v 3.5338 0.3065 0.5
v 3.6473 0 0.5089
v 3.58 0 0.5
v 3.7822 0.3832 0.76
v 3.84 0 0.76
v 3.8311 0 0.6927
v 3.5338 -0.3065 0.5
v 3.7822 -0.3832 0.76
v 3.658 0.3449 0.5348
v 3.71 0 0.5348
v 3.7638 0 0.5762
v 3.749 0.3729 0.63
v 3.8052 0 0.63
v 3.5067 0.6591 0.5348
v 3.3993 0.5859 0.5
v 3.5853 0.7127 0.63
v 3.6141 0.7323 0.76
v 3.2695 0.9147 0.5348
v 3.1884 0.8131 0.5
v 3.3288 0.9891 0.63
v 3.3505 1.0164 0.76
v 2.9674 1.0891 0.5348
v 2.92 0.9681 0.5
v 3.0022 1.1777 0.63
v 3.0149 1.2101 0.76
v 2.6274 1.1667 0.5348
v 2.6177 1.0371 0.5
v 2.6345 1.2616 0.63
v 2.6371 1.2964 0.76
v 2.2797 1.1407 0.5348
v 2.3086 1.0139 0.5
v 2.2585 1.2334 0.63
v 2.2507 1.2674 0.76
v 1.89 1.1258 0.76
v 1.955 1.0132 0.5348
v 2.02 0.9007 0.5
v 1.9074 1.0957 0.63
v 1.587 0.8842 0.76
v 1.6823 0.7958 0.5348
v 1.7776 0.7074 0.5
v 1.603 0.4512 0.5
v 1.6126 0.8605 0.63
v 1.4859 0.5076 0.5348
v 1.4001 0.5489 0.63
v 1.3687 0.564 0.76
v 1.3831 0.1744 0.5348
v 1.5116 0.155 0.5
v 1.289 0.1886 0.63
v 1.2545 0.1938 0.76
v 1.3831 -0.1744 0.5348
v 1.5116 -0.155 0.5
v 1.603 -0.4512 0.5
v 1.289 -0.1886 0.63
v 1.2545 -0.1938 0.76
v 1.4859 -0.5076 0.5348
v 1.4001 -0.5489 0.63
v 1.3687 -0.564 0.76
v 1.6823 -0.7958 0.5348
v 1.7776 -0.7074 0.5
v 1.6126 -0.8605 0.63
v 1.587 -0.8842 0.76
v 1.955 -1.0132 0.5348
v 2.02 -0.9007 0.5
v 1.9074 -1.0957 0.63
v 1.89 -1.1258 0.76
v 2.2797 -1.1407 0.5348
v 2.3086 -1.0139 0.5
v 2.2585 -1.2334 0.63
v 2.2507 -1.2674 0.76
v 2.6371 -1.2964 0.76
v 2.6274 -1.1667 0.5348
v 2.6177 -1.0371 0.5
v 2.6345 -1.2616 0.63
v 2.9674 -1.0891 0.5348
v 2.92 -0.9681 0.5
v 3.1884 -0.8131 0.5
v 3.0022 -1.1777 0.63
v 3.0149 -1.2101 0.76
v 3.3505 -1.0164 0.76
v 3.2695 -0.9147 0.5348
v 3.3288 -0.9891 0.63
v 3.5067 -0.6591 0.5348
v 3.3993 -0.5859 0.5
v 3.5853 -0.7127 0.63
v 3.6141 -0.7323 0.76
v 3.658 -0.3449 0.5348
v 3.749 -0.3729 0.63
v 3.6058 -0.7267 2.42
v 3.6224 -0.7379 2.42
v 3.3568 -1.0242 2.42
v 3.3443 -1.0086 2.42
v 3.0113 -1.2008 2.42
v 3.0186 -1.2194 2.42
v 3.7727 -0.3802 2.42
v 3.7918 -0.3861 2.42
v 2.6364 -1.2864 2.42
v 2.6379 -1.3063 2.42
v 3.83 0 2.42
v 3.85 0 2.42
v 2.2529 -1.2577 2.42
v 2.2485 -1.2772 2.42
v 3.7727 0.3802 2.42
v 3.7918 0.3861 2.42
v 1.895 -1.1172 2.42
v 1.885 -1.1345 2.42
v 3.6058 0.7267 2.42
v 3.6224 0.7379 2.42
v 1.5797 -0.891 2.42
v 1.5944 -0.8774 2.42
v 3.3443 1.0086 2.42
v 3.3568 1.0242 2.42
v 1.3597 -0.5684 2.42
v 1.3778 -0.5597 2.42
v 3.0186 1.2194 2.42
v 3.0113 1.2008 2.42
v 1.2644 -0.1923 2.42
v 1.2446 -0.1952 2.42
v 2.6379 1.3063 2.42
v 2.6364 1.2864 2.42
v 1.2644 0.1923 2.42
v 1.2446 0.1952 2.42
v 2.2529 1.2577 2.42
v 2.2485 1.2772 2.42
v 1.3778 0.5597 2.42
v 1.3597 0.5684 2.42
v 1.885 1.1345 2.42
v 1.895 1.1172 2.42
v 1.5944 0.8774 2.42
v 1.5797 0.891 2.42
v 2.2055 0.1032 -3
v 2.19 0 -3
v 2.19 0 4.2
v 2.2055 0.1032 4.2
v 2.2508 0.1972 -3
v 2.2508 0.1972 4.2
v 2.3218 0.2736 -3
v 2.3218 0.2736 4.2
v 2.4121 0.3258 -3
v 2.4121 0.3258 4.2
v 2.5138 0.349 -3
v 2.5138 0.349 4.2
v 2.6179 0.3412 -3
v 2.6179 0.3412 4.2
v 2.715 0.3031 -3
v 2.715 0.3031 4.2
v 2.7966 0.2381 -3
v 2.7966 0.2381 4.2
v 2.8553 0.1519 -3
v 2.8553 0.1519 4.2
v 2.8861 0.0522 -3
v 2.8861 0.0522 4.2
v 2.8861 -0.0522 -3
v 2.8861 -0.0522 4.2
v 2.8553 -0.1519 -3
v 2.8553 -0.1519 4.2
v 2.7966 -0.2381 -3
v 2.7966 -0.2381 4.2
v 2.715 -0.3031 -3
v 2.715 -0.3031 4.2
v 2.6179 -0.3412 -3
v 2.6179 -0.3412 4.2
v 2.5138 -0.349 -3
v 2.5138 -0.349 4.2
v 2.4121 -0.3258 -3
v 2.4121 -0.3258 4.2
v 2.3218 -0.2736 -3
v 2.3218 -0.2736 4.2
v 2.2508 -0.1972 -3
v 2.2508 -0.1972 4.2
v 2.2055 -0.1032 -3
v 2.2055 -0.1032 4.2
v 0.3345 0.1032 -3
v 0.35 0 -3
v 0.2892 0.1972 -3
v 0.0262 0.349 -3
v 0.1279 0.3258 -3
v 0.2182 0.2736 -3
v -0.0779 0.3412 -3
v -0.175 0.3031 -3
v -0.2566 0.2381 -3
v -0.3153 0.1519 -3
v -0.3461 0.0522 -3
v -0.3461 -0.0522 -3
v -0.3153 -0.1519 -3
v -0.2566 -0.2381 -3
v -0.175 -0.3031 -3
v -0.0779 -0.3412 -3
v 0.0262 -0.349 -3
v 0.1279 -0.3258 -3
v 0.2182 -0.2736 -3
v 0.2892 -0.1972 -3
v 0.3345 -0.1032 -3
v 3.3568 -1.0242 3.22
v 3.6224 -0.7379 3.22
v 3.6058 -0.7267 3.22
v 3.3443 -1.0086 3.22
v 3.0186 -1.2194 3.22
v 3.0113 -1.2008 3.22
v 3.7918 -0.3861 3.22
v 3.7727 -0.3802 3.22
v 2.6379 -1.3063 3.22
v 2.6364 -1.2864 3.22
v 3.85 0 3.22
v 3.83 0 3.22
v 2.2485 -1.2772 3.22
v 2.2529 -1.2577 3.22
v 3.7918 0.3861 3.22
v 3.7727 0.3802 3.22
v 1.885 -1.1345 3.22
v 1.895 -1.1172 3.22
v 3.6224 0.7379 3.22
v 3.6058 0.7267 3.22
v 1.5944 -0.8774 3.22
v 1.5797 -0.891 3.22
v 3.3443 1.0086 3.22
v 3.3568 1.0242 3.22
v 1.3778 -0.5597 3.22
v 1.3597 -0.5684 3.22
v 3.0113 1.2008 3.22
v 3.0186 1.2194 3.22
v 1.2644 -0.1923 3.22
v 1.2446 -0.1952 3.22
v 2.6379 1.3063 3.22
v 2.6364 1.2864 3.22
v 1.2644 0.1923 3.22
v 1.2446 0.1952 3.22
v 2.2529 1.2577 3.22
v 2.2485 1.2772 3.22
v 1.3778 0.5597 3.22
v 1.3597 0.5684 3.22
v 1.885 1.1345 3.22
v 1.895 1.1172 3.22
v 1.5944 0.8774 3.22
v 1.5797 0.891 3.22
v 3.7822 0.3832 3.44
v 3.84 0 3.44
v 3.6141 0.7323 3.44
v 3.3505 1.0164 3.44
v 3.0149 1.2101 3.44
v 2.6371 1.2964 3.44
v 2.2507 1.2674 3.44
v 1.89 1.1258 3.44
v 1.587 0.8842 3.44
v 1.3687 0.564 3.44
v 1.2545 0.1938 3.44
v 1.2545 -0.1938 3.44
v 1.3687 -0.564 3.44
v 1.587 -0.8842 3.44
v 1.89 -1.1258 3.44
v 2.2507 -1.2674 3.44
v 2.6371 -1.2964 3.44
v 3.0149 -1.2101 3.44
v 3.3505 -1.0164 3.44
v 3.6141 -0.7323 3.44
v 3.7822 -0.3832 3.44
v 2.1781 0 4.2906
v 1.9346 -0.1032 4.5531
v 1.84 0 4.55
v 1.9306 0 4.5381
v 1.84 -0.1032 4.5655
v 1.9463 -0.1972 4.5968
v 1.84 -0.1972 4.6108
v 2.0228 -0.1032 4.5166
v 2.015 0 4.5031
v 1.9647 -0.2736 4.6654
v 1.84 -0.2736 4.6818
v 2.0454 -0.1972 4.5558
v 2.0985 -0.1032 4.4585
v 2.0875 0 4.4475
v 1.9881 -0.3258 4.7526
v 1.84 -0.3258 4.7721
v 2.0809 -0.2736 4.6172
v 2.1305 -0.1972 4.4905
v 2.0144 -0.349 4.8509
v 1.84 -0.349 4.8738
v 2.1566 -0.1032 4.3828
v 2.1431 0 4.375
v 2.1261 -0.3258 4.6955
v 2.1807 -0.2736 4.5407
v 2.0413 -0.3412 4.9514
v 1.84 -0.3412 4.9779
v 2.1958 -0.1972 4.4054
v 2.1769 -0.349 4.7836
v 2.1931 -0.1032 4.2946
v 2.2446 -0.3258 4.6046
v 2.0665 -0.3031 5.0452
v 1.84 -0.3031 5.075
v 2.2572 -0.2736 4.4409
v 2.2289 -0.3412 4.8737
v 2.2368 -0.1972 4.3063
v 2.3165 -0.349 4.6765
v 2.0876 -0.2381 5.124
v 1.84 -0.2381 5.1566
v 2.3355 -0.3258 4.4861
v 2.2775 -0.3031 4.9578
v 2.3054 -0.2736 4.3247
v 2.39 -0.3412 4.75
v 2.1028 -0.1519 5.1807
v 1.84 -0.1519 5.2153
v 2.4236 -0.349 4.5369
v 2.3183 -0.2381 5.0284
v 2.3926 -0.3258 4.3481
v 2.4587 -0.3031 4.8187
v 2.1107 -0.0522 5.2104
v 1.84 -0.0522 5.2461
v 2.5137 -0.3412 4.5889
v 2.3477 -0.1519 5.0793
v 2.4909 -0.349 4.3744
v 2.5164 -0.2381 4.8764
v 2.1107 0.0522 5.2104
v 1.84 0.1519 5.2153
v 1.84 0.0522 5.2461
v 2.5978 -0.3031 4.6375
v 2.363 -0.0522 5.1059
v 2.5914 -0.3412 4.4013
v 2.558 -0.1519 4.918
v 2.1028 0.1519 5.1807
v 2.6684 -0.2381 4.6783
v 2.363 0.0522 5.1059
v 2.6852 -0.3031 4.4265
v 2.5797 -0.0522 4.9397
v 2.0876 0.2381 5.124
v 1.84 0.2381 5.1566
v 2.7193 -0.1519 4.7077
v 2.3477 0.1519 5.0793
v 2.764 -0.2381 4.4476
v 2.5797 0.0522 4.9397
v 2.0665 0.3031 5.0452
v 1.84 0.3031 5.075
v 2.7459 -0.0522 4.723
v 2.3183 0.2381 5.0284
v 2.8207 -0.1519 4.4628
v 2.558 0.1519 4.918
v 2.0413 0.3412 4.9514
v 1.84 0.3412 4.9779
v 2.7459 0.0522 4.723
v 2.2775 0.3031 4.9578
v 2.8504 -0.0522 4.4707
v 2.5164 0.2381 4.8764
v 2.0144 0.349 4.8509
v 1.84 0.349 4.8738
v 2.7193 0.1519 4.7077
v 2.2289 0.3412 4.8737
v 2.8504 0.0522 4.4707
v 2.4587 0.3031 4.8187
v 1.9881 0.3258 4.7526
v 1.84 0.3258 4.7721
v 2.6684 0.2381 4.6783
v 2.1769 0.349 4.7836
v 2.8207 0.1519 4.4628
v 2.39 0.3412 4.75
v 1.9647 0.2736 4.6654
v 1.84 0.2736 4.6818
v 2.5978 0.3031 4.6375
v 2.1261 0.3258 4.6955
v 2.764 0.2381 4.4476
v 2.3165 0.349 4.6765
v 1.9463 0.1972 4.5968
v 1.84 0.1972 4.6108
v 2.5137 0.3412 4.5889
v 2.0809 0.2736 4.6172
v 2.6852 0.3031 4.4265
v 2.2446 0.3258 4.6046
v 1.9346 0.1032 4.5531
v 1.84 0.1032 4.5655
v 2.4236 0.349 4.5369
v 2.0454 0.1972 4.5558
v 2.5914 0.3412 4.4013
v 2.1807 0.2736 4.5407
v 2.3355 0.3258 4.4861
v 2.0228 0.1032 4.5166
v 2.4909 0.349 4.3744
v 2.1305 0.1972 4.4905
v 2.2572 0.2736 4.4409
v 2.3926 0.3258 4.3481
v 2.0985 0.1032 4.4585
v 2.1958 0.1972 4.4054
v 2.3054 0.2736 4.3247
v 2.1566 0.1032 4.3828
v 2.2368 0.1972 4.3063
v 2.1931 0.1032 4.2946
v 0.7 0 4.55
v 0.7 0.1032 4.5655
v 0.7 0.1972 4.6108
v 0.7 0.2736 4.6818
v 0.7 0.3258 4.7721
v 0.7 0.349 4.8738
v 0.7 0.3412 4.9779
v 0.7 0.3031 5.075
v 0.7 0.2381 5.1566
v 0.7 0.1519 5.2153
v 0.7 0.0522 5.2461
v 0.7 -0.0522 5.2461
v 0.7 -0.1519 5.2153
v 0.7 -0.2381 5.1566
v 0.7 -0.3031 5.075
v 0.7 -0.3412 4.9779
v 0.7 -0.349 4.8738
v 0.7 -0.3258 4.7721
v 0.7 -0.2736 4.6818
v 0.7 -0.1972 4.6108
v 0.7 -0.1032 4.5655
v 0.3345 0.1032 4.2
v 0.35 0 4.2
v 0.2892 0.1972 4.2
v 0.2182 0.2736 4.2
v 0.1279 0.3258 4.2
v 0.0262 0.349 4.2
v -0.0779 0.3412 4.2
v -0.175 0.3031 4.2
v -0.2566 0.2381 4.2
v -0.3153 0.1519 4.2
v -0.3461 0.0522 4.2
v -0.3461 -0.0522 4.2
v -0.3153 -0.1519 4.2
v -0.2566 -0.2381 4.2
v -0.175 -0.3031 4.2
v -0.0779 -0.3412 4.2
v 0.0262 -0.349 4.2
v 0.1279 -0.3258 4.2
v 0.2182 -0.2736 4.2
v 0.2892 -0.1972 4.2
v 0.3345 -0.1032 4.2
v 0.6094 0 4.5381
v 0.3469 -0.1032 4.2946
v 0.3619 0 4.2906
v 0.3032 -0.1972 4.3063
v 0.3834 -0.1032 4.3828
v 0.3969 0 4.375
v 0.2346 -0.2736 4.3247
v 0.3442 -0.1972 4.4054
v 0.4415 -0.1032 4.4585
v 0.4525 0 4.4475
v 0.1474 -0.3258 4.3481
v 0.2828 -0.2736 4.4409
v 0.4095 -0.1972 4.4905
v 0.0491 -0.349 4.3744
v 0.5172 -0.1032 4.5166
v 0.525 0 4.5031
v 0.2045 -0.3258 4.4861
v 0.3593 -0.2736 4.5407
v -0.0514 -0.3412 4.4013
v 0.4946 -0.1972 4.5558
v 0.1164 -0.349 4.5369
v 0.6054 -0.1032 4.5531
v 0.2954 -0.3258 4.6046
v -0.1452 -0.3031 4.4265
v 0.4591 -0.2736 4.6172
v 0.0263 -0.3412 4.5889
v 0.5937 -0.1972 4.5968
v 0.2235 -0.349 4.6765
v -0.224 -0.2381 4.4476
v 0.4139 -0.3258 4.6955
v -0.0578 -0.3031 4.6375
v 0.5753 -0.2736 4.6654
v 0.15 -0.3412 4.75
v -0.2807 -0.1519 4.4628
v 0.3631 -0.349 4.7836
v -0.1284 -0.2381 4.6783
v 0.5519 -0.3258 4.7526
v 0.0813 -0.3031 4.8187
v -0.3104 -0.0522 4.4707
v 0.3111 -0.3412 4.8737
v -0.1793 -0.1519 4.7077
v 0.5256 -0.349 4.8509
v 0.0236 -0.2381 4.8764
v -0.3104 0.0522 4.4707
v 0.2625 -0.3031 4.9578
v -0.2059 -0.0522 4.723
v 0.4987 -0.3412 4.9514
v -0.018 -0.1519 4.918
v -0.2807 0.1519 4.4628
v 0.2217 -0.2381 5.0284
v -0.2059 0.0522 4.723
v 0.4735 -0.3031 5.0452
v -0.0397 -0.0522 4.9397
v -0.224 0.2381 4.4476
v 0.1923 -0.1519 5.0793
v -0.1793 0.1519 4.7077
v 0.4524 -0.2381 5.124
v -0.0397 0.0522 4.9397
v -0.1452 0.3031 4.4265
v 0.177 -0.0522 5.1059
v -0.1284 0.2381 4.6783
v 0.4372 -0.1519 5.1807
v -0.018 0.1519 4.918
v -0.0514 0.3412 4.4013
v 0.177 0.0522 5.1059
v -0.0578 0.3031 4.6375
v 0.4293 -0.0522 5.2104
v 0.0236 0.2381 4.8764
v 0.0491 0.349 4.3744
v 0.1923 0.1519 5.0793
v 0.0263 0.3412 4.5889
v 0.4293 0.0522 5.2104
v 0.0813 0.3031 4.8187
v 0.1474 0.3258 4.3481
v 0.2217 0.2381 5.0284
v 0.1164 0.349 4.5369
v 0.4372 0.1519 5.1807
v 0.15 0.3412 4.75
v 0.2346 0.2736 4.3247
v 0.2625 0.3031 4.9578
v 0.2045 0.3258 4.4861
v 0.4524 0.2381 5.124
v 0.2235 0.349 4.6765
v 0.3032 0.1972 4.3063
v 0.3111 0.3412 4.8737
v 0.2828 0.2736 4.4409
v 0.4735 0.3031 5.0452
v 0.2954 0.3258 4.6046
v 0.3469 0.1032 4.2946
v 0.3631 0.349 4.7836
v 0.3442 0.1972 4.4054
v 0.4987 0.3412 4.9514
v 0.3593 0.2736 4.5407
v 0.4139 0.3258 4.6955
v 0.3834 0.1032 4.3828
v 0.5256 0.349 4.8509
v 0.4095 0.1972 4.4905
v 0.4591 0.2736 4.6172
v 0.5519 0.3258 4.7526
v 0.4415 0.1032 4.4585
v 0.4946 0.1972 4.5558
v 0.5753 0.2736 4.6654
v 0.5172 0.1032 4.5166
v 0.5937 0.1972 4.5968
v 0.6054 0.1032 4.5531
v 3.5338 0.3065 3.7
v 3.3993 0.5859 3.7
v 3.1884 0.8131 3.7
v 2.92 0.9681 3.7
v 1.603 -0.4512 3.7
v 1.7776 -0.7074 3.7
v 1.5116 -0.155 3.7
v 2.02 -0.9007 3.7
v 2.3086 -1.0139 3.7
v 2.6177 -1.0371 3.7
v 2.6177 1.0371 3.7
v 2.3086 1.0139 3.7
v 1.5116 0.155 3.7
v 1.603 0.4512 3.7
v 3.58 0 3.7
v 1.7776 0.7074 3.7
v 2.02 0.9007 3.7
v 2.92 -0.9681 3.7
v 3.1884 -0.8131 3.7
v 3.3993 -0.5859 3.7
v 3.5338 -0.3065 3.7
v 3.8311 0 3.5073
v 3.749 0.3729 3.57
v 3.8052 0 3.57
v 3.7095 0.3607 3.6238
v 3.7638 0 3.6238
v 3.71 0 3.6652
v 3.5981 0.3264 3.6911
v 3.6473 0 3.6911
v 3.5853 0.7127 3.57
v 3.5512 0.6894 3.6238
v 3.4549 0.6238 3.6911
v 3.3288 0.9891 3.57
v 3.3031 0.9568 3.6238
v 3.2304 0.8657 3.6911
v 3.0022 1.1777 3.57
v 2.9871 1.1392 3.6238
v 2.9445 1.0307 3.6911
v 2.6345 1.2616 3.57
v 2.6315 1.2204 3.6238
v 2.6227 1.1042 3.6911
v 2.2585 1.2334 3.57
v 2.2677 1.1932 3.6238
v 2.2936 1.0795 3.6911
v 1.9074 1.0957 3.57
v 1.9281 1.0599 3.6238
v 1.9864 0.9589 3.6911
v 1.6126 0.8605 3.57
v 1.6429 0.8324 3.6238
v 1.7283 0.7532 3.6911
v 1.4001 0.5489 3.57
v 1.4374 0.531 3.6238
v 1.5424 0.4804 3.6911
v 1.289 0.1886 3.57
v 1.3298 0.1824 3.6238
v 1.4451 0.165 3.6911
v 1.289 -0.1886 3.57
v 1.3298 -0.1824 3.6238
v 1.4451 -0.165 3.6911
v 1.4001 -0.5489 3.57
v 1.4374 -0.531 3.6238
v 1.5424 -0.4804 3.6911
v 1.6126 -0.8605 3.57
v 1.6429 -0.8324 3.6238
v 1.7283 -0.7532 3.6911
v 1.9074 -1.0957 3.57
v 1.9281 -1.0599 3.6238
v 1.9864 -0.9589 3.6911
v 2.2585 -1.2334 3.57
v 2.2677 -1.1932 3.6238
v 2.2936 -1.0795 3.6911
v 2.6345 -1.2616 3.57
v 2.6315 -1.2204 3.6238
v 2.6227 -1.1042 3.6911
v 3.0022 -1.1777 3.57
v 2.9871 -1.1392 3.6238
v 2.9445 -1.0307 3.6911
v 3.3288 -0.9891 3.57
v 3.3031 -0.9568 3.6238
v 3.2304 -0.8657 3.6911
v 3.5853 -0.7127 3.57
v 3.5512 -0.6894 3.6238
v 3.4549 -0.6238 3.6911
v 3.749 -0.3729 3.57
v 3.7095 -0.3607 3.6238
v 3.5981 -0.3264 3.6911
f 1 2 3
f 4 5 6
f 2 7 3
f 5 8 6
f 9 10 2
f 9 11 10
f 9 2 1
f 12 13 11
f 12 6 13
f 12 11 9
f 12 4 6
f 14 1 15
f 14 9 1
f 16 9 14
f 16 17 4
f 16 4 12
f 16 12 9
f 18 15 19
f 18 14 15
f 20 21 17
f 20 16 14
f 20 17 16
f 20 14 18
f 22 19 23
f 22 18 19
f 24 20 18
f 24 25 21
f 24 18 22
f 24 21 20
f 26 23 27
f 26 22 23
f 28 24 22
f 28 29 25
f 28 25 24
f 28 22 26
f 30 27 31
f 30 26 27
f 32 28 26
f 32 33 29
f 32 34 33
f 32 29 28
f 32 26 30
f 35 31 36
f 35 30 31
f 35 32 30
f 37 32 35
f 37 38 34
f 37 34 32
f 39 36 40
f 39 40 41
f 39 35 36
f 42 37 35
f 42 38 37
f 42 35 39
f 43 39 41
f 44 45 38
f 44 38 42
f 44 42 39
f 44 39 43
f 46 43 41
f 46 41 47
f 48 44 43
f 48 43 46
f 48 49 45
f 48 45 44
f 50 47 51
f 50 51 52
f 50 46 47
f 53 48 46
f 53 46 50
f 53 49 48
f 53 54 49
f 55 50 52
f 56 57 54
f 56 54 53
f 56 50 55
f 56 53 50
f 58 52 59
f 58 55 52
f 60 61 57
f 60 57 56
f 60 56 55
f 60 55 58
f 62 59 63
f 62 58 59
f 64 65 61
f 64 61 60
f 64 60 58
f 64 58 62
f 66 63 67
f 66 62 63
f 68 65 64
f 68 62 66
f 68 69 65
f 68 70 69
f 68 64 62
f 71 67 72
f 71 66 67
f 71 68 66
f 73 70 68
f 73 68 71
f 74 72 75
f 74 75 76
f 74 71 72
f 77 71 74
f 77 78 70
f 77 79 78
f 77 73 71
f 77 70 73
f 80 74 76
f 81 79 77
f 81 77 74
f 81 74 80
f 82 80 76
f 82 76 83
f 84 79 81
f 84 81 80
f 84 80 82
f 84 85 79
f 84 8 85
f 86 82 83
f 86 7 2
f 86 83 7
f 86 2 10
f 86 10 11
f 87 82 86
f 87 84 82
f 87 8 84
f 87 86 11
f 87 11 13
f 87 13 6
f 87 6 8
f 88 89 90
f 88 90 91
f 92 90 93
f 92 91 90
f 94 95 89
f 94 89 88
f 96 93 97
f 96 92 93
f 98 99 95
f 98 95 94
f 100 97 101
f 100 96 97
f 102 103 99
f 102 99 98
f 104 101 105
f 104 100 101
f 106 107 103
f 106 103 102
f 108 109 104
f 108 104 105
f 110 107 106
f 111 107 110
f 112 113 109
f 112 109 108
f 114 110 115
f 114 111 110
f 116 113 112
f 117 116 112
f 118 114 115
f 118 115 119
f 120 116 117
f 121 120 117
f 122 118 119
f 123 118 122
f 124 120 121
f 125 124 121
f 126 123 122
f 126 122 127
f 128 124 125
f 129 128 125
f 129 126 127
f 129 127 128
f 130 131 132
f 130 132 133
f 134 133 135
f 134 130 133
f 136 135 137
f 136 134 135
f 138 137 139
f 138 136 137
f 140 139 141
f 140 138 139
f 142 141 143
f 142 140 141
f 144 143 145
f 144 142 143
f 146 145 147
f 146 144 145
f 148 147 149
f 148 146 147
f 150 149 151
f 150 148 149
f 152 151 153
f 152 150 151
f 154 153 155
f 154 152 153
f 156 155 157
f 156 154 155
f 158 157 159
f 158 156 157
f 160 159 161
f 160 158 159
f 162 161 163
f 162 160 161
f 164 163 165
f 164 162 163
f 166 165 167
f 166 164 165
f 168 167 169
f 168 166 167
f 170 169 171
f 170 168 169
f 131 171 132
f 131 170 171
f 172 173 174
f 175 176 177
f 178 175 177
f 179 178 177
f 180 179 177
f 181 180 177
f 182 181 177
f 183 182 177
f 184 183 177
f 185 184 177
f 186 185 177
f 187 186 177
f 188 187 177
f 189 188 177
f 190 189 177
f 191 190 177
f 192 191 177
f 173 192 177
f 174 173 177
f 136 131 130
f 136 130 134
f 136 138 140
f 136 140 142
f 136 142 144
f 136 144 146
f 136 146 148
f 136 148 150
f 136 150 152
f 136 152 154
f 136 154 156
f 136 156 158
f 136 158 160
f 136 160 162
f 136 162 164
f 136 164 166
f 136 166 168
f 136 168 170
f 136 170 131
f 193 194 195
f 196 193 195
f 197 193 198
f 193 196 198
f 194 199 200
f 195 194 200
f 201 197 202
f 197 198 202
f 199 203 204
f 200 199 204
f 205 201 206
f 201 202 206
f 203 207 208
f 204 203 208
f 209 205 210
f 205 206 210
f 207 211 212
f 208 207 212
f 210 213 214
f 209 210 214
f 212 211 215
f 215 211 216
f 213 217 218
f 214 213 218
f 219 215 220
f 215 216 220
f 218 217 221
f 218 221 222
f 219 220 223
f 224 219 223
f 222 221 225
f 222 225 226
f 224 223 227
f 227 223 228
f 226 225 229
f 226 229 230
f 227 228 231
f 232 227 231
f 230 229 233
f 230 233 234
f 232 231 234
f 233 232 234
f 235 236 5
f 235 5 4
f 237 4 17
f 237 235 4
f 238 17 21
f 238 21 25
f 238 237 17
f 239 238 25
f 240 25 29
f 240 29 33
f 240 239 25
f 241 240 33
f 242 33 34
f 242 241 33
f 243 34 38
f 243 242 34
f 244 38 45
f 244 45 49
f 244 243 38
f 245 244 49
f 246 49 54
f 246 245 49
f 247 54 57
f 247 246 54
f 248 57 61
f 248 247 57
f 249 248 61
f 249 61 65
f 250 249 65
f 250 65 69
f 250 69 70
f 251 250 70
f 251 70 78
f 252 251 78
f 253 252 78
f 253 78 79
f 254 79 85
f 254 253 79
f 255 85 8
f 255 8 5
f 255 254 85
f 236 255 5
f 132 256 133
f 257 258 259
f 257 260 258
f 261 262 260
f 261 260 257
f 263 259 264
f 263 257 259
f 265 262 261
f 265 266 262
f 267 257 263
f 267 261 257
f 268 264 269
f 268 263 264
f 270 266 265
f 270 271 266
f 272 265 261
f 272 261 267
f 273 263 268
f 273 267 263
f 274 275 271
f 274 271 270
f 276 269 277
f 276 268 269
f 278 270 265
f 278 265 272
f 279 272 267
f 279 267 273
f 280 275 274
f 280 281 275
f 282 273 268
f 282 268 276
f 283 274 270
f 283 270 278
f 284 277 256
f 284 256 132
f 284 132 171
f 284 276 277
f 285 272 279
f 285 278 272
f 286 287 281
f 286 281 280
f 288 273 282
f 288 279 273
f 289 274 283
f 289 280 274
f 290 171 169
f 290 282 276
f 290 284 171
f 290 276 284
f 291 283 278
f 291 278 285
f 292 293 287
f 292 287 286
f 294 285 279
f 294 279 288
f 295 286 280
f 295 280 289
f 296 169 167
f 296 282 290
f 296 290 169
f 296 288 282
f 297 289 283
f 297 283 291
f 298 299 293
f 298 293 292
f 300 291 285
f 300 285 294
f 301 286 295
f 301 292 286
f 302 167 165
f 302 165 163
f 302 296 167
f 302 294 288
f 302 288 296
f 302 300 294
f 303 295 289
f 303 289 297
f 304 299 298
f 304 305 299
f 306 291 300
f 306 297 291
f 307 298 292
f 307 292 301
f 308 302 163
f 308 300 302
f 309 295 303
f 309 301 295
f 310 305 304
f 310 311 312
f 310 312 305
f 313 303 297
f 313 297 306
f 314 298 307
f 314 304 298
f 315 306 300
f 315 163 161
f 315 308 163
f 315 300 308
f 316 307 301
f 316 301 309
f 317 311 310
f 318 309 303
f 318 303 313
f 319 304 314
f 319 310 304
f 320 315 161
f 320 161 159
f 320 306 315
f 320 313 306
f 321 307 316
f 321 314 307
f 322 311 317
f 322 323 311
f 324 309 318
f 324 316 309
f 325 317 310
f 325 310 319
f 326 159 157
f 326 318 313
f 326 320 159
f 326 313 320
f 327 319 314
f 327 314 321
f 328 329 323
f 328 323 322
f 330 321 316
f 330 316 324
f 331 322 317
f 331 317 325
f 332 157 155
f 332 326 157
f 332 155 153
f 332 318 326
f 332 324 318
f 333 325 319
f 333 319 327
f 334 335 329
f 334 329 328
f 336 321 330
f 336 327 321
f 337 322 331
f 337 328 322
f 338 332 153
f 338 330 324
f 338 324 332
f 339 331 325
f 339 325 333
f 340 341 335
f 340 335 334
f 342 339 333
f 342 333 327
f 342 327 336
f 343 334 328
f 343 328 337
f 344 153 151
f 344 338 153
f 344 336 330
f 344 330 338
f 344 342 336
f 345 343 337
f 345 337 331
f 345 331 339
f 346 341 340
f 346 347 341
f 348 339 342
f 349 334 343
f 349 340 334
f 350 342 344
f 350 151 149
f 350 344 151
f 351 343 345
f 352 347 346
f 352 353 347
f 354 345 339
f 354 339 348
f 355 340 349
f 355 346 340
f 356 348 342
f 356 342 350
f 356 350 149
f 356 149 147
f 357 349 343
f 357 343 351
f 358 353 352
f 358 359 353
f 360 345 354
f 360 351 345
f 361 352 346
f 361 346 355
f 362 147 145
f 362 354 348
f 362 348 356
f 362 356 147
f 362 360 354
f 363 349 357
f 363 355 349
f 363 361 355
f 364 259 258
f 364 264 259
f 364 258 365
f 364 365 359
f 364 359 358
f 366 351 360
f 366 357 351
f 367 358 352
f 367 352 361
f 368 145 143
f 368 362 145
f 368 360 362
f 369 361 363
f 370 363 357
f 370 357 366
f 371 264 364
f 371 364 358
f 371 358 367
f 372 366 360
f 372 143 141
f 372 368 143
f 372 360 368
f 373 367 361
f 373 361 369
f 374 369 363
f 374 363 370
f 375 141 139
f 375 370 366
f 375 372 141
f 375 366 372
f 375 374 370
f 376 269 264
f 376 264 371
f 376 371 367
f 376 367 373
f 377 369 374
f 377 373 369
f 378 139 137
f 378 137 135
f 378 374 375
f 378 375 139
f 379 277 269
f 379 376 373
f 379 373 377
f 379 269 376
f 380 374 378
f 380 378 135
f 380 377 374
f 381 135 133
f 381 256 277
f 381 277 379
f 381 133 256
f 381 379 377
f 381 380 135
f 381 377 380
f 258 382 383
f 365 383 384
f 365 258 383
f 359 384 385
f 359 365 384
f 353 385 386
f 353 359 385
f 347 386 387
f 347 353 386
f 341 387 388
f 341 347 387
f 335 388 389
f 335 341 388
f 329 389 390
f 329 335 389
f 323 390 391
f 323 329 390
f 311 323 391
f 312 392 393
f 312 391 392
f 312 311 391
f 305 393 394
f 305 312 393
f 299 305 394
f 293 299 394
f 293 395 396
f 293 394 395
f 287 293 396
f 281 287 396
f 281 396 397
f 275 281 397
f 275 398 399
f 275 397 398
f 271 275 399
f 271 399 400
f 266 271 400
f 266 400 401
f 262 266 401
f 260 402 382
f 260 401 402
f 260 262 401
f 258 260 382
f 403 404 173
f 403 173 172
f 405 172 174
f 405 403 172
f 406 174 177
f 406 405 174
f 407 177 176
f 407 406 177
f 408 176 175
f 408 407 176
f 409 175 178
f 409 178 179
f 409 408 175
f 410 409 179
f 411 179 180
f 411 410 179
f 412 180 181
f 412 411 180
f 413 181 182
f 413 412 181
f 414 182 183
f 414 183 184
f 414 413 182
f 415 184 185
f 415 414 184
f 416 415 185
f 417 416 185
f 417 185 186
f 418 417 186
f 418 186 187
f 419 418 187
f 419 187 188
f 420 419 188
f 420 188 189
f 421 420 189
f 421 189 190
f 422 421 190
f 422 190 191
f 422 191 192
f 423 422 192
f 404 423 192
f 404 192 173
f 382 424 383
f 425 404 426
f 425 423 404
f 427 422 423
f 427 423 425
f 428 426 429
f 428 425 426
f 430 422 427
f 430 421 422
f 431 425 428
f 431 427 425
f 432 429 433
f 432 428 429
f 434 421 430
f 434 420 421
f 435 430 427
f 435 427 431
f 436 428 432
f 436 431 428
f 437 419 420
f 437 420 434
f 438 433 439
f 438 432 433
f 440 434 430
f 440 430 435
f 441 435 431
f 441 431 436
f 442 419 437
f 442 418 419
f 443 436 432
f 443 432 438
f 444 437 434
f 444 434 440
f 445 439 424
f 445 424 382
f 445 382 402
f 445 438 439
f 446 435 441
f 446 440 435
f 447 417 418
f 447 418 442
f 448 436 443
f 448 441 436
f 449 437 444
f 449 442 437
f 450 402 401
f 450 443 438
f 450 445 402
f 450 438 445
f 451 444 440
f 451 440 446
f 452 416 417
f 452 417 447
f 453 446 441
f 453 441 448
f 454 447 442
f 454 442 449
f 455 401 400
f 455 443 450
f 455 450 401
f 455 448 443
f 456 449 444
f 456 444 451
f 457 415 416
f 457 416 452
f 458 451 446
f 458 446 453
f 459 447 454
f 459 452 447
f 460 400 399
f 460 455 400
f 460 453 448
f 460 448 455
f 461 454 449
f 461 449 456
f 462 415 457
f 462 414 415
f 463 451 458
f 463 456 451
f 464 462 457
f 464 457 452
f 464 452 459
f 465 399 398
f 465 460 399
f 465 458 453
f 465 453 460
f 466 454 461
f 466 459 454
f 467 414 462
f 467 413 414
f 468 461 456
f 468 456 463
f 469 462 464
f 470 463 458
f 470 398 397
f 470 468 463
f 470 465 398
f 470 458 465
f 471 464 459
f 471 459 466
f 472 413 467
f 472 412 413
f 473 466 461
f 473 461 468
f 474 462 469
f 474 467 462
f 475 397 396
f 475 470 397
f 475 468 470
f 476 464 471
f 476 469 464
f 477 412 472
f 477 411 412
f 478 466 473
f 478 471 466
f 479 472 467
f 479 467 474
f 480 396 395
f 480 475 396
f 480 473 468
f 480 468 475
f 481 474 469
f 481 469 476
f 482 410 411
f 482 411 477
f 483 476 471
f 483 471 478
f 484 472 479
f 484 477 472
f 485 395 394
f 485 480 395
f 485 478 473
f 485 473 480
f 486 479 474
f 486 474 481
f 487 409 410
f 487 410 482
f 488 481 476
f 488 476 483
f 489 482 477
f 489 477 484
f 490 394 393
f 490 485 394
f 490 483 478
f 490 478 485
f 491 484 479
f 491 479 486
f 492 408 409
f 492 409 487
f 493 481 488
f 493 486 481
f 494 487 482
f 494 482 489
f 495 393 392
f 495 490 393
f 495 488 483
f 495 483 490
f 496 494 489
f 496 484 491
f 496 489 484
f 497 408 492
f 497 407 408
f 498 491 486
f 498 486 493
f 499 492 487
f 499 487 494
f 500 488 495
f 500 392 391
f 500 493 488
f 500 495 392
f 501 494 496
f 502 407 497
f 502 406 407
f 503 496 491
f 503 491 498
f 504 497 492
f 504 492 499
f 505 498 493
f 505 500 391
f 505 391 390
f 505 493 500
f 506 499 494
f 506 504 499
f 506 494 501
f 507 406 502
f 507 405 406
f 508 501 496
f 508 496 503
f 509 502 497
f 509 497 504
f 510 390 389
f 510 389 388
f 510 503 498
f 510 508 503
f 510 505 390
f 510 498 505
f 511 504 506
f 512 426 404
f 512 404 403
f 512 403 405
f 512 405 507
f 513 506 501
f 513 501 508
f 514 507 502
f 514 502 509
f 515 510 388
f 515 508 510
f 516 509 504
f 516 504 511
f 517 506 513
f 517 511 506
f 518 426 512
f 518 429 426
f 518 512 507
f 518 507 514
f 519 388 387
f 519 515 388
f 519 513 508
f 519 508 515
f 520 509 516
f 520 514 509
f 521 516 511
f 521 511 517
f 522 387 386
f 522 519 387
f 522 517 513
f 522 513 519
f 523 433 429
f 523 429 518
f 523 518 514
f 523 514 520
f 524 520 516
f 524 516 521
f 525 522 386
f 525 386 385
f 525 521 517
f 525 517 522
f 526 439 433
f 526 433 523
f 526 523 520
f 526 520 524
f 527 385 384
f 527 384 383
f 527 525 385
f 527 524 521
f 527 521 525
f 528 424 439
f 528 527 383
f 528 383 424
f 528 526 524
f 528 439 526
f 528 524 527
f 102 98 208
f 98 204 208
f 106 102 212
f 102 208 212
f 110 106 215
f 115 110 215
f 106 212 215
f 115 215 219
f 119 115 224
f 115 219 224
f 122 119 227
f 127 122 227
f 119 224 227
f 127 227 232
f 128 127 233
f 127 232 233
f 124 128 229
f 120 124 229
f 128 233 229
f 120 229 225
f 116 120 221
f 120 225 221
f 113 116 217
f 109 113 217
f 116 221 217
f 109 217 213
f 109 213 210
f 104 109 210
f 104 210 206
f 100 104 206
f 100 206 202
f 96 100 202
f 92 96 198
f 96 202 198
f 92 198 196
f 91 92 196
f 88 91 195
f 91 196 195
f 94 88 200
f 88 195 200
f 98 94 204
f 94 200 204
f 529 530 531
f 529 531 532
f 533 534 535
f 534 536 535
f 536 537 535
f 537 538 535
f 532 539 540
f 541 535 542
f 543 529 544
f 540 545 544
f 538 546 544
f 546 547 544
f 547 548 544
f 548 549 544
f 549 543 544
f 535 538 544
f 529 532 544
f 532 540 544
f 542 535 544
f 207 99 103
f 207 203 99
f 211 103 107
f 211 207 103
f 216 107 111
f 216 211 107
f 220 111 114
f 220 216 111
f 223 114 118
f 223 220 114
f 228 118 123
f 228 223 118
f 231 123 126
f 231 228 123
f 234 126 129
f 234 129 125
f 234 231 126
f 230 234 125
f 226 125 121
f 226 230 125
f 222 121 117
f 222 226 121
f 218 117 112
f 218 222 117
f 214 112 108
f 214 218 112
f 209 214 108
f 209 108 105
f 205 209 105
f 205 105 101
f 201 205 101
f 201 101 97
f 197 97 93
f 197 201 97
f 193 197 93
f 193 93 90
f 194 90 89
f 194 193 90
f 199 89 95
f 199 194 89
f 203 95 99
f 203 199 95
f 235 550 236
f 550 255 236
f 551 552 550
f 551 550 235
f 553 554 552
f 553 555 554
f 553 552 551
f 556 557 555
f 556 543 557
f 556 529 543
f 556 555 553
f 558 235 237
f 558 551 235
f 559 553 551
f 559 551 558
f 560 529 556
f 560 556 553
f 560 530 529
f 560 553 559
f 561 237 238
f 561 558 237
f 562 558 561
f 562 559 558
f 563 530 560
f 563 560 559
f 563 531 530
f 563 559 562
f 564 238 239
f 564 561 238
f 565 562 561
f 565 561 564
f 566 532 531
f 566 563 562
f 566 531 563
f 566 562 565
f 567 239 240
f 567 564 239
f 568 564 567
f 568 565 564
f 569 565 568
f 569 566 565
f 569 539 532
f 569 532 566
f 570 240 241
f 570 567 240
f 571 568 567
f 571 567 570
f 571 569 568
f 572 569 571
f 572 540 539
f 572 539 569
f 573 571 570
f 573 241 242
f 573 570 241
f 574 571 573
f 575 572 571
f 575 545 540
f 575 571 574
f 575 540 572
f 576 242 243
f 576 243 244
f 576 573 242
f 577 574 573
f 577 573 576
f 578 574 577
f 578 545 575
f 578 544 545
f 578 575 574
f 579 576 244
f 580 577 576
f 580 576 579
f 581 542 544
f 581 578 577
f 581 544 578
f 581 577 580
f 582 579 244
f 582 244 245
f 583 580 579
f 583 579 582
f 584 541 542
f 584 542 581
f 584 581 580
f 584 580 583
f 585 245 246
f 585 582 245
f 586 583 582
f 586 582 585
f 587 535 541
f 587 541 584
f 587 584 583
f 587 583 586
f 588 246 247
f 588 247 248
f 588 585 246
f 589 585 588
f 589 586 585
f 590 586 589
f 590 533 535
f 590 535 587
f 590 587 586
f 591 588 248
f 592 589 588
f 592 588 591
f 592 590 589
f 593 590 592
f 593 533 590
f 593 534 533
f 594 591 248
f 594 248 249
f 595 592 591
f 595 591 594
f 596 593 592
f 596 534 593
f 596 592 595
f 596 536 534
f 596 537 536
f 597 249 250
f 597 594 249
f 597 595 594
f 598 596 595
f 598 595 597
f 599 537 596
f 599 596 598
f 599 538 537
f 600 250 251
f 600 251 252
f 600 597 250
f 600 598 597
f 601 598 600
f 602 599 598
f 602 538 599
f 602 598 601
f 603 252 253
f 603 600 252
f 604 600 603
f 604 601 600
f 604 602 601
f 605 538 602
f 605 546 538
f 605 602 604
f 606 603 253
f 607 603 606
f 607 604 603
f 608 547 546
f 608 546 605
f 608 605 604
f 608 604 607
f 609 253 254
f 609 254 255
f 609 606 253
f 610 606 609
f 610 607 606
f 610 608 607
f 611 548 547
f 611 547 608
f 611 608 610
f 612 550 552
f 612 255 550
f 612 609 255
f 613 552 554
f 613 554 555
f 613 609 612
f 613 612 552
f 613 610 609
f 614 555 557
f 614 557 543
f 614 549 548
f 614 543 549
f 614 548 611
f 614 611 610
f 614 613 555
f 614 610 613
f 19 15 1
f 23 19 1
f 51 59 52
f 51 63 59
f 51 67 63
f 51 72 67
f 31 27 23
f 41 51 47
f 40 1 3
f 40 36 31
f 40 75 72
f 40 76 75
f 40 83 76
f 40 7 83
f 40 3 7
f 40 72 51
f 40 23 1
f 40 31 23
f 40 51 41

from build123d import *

# Parameters (mm, degrees)
SKETCH001_R = 0.35
SKETCH003_W = 0.02
SKETCH003_H = 0.8
SKETCH002_W = 1.3
SKETCH002_H = 3.2
FILLET_R    = 0.26


with BuildPart() as sweep_body:
    # Sweep: sweep along a path in Sketch
    with BuildLine(Plane.XZ) as sweep_path:
        Line((0, -3), (0, 4.2))
        ThreePointArc((0, 4.2), (0.205025, 4.694975), (0.7, 4.9))
        Line((0.7, 4.9), (1.84, 4.9))
        ThreePointArc((1.84, 4.9), (2.334975, 4.694975), (2.54, 4.2))
        Line((2.54, 4.2), (2.54, -3))
    # Sketch001 → Sweep (sweep)
    with BuildSketch(Plane.XY):
        Circle(SKETCH001_R)
    sweep(path=sweep_path.line)


with BuildPart() as revolution001:
    # Sketch003 → Revolution001 (revolve)
    with BuildSketch(Plane.XZ):
        with Locations((3.84, 2.82)):
            Rectangle(SKETCH003_W, SKETCH003_H)
    revolve(axis=Axis((2.54, 0, 5.9), (0, 0, 1)))


with BuildPart() as fillet_body:
    # Sketch002 → Revolution (revolve)
    with BuildSketch(Plane.XZ):
        with Locations((3.19, 2.1)):
            Rectangle(SKETCH002_W, SKETCH002_H)
    revolve(axis=Axis((2.54, 0, 0.5), (0, 0, 1)))

    # Fillet
    fillet_edges = [fillet_body.edges().sort_by_distance(p)[0] for p in [
        (1.24, 0, 3.7),
        (1.24, 0, 0.5),
    ]]
    fillet(fillet_edges, radius=FILLET_R)


solid = Compound([sweep_body.part, revolution001.part, fillet_body.part])
